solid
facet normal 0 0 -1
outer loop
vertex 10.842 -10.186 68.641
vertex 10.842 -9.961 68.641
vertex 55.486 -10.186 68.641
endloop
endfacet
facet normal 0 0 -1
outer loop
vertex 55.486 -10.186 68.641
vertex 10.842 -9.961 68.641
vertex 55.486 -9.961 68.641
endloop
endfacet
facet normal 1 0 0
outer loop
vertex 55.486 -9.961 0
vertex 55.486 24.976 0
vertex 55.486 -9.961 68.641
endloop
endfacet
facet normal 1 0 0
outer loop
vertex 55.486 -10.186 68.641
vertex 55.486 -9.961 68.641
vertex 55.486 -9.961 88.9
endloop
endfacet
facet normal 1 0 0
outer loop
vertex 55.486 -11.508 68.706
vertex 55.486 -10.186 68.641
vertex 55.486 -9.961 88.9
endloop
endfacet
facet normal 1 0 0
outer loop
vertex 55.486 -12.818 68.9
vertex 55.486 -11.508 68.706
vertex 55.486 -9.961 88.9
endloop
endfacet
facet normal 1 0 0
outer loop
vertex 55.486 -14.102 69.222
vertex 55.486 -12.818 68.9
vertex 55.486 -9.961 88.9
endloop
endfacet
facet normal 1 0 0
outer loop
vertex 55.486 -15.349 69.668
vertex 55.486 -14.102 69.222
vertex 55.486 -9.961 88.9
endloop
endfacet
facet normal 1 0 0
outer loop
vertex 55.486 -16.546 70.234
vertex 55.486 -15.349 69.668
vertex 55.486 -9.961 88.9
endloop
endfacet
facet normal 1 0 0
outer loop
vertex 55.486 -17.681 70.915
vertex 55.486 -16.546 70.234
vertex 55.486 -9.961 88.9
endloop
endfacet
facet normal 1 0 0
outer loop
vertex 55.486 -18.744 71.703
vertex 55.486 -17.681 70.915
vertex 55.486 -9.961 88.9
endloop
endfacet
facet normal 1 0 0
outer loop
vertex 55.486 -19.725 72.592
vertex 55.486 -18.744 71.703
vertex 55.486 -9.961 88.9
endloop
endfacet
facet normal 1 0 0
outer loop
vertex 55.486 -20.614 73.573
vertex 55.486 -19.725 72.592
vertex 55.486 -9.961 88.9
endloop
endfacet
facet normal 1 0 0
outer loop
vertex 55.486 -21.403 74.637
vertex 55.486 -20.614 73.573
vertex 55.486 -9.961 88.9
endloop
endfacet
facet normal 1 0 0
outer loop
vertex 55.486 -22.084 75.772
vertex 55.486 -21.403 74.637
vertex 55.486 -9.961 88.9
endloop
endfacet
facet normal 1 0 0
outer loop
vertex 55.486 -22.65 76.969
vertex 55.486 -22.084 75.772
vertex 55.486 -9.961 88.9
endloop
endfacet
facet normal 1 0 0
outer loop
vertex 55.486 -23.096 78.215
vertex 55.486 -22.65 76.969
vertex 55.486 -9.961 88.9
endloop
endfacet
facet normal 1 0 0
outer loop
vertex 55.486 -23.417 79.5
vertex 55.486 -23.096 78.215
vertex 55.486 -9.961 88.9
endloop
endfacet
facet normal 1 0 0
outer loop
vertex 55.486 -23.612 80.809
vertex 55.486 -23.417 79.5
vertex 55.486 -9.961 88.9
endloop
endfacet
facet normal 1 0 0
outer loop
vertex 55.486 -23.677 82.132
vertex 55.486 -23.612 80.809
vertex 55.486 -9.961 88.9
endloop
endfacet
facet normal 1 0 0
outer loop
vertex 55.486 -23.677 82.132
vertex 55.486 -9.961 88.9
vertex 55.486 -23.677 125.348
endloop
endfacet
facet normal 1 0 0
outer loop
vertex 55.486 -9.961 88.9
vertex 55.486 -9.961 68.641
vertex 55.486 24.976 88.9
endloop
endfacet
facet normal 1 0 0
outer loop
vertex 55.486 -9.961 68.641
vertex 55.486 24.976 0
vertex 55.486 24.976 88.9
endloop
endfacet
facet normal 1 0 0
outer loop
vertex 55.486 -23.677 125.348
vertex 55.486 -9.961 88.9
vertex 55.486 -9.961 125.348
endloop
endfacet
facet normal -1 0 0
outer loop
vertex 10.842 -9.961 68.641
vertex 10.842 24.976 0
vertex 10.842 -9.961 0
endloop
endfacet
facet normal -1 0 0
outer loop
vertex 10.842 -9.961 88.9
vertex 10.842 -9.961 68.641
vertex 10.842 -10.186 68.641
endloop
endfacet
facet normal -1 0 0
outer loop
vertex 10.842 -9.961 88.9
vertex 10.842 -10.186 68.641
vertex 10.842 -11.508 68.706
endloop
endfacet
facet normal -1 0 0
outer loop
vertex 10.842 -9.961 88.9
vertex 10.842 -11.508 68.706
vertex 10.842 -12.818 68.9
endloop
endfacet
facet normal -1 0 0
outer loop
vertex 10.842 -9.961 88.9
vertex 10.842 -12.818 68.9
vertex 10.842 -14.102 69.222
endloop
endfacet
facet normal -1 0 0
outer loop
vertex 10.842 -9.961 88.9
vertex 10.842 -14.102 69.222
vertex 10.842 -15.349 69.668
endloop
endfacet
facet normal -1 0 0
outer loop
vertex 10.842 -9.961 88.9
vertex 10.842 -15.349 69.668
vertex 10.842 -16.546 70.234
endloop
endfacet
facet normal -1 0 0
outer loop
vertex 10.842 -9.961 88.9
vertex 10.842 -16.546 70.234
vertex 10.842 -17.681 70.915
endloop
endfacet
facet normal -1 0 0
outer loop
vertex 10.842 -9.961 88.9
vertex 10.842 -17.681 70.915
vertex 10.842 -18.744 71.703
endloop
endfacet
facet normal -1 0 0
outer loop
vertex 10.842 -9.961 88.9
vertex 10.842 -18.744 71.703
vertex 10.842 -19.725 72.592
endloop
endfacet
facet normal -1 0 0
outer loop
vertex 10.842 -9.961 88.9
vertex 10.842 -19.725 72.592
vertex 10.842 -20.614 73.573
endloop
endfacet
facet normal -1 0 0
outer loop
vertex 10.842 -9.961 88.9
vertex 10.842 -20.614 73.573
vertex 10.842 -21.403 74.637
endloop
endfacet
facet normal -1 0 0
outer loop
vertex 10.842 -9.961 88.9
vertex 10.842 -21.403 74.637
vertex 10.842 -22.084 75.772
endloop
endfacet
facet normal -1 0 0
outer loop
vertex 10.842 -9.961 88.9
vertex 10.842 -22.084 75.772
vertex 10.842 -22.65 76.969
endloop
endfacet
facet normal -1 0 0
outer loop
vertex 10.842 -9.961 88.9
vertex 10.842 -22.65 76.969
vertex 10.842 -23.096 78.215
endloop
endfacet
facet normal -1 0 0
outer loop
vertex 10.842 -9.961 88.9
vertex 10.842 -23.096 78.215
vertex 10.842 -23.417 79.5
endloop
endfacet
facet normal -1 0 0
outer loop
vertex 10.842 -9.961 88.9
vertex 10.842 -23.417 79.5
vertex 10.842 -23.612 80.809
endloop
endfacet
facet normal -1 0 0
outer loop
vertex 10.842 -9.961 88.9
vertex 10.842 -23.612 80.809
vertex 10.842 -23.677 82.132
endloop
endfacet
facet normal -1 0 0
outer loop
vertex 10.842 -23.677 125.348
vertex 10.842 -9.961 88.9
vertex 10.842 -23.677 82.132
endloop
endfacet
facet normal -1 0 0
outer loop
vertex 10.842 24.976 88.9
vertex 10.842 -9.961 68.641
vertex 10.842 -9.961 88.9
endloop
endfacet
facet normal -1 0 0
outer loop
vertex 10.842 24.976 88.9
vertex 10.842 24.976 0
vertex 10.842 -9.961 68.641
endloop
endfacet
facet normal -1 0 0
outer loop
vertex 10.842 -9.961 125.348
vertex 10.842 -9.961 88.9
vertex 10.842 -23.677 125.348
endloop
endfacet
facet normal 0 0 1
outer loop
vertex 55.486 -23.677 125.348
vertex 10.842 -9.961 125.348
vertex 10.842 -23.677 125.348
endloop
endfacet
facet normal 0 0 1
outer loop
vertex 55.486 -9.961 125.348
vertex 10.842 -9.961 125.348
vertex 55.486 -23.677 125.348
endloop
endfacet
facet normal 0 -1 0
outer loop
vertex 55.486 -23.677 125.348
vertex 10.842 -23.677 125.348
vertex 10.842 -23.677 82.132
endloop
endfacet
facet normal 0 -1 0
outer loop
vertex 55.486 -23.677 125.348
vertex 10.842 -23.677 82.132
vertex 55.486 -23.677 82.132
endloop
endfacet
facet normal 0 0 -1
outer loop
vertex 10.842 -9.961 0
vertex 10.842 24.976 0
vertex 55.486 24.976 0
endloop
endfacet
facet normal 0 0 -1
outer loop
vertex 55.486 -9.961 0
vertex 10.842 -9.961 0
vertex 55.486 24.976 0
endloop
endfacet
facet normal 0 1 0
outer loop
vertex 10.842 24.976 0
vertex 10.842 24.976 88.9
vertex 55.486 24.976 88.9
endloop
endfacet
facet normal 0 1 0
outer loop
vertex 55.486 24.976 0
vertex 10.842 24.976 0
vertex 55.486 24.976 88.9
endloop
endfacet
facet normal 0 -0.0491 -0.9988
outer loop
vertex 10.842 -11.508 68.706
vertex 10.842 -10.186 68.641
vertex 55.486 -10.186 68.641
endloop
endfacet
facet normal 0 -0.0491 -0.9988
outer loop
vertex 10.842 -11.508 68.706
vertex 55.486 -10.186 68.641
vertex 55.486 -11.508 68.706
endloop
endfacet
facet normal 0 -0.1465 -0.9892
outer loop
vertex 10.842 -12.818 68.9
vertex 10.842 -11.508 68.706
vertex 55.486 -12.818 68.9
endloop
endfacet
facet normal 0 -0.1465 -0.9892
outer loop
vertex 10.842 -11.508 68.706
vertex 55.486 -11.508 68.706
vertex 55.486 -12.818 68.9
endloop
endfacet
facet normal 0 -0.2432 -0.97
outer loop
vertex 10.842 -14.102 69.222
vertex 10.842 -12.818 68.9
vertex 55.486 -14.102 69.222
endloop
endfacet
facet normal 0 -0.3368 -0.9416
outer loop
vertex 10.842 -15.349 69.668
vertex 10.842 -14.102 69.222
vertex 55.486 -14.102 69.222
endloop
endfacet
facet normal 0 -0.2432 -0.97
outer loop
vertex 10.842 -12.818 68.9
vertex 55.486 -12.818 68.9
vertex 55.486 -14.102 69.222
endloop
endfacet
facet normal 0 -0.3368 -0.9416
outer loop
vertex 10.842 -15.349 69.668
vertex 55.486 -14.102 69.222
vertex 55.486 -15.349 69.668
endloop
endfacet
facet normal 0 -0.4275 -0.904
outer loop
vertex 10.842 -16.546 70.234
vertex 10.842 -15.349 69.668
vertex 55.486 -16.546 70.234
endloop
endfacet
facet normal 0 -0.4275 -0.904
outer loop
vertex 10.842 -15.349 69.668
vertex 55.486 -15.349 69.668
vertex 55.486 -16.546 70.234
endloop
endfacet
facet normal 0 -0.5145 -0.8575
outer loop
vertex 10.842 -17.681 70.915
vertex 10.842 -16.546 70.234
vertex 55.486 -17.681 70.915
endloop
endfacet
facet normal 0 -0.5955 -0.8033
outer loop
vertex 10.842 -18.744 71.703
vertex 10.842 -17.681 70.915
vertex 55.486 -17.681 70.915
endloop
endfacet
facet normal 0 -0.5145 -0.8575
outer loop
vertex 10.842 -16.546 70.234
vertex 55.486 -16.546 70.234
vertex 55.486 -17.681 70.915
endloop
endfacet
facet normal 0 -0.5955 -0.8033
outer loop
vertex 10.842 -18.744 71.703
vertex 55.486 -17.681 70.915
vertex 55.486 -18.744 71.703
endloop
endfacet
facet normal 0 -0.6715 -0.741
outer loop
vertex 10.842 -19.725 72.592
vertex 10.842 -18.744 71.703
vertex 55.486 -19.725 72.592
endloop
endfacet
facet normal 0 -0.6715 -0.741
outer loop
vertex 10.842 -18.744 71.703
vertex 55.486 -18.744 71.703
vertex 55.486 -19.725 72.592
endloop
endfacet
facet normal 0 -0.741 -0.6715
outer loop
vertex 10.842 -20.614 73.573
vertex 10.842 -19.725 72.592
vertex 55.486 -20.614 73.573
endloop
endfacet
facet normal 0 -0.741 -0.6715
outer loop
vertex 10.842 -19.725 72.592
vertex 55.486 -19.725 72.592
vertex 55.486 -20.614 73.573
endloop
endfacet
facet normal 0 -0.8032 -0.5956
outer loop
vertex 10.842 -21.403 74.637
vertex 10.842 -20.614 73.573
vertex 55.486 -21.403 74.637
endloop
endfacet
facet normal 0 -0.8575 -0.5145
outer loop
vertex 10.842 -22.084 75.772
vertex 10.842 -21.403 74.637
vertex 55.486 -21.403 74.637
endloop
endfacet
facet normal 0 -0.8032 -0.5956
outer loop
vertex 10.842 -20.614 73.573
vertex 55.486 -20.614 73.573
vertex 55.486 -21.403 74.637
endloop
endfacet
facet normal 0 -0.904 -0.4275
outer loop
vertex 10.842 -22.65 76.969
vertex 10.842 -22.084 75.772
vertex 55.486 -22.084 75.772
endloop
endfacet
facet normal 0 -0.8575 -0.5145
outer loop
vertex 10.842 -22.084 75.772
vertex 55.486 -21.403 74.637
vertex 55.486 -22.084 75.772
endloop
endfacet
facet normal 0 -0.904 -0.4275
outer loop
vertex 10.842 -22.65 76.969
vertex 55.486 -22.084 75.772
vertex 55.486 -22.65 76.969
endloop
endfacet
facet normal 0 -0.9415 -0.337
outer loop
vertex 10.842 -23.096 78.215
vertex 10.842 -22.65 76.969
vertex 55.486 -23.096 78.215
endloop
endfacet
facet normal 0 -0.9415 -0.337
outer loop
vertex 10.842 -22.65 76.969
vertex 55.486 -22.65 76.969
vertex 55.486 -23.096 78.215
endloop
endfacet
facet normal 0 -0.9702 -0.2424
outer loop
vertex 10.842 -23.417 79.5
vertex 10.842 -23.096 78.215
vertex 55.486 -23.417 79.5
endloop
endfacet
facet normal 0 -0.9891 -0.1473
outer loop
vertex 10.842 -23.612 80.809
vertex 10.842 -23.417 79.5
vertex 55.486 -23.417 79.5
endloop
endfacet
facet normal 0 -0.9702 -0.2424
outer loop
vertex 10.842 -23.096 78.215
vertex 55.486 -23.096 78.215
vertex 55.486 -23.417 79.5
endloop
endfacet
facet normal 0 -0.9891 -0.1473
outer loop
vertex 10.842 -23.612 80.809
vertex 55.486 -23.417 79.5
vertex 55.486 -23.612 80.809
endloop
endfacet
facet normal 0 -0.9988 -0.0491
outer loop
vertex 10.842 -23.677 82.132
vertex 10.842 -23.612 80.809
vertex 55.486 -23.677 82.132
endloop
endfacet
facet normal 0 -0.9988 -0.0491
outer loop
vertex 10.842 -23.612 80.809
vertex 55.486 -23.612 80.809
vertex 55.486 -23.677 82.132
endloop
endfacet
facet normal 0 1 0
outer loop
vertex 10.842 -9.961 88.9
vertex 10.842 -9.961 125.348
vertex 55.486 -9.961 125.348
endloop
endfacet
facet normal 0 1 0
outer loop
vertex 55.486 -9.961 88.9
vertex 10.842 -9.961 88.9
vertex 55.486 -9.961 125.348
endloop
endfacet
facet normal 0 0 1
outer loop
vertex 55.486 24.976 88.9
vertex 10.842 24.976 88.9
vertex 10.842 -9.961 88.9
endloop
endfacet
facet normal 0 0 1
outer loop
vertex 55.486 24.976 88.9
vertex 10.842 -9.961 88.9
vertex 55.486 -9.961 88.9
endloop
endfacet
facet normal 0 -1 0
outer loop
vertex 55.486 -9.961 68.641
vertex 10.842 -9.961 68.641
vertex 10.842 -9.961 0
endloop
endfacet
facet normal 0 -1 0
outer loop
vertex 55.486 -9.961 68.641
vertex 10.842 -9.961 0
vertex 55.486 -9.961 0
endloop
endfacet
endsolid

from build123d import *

# Parameters (mm, degrees)
F0_W     = 44.6442011744
F0_H     = 34.9367577583
F1_DEPTH = 88.9
F2_W     = 44.6442011744
F2_H     = 56.7069426179
F3_DEPTH = 13.716
F4_R     = 13.4906253865


with BuildPart() as f1:
    # F0 (on Top) → F1 (new body)
    with BuildSketch(Plane.XY):
        with Locations((33.164284192, 7.5076622888)):
            Rectangle(F0_W, F0_H)
    extrude(amount=F1_DEPTH)

    # F2 (on face) → F3 (join)
    with BuildSketch(Plane.XZ.offset(9.9607165903)):
        with Locations((33.164284192, 96.9944112003)):
            Rectangle(F2_W, F2_H)
    extrude(amount=F3_DEPTH)

    # F4
    f4_edges = [f1.edges().sort_by_distance(p)[0] for p in [
        (33.164284, -23.676717, 68.64094),
    ]]
    fillet(f4_edges, radius=F4_R)


solid = f1.part
